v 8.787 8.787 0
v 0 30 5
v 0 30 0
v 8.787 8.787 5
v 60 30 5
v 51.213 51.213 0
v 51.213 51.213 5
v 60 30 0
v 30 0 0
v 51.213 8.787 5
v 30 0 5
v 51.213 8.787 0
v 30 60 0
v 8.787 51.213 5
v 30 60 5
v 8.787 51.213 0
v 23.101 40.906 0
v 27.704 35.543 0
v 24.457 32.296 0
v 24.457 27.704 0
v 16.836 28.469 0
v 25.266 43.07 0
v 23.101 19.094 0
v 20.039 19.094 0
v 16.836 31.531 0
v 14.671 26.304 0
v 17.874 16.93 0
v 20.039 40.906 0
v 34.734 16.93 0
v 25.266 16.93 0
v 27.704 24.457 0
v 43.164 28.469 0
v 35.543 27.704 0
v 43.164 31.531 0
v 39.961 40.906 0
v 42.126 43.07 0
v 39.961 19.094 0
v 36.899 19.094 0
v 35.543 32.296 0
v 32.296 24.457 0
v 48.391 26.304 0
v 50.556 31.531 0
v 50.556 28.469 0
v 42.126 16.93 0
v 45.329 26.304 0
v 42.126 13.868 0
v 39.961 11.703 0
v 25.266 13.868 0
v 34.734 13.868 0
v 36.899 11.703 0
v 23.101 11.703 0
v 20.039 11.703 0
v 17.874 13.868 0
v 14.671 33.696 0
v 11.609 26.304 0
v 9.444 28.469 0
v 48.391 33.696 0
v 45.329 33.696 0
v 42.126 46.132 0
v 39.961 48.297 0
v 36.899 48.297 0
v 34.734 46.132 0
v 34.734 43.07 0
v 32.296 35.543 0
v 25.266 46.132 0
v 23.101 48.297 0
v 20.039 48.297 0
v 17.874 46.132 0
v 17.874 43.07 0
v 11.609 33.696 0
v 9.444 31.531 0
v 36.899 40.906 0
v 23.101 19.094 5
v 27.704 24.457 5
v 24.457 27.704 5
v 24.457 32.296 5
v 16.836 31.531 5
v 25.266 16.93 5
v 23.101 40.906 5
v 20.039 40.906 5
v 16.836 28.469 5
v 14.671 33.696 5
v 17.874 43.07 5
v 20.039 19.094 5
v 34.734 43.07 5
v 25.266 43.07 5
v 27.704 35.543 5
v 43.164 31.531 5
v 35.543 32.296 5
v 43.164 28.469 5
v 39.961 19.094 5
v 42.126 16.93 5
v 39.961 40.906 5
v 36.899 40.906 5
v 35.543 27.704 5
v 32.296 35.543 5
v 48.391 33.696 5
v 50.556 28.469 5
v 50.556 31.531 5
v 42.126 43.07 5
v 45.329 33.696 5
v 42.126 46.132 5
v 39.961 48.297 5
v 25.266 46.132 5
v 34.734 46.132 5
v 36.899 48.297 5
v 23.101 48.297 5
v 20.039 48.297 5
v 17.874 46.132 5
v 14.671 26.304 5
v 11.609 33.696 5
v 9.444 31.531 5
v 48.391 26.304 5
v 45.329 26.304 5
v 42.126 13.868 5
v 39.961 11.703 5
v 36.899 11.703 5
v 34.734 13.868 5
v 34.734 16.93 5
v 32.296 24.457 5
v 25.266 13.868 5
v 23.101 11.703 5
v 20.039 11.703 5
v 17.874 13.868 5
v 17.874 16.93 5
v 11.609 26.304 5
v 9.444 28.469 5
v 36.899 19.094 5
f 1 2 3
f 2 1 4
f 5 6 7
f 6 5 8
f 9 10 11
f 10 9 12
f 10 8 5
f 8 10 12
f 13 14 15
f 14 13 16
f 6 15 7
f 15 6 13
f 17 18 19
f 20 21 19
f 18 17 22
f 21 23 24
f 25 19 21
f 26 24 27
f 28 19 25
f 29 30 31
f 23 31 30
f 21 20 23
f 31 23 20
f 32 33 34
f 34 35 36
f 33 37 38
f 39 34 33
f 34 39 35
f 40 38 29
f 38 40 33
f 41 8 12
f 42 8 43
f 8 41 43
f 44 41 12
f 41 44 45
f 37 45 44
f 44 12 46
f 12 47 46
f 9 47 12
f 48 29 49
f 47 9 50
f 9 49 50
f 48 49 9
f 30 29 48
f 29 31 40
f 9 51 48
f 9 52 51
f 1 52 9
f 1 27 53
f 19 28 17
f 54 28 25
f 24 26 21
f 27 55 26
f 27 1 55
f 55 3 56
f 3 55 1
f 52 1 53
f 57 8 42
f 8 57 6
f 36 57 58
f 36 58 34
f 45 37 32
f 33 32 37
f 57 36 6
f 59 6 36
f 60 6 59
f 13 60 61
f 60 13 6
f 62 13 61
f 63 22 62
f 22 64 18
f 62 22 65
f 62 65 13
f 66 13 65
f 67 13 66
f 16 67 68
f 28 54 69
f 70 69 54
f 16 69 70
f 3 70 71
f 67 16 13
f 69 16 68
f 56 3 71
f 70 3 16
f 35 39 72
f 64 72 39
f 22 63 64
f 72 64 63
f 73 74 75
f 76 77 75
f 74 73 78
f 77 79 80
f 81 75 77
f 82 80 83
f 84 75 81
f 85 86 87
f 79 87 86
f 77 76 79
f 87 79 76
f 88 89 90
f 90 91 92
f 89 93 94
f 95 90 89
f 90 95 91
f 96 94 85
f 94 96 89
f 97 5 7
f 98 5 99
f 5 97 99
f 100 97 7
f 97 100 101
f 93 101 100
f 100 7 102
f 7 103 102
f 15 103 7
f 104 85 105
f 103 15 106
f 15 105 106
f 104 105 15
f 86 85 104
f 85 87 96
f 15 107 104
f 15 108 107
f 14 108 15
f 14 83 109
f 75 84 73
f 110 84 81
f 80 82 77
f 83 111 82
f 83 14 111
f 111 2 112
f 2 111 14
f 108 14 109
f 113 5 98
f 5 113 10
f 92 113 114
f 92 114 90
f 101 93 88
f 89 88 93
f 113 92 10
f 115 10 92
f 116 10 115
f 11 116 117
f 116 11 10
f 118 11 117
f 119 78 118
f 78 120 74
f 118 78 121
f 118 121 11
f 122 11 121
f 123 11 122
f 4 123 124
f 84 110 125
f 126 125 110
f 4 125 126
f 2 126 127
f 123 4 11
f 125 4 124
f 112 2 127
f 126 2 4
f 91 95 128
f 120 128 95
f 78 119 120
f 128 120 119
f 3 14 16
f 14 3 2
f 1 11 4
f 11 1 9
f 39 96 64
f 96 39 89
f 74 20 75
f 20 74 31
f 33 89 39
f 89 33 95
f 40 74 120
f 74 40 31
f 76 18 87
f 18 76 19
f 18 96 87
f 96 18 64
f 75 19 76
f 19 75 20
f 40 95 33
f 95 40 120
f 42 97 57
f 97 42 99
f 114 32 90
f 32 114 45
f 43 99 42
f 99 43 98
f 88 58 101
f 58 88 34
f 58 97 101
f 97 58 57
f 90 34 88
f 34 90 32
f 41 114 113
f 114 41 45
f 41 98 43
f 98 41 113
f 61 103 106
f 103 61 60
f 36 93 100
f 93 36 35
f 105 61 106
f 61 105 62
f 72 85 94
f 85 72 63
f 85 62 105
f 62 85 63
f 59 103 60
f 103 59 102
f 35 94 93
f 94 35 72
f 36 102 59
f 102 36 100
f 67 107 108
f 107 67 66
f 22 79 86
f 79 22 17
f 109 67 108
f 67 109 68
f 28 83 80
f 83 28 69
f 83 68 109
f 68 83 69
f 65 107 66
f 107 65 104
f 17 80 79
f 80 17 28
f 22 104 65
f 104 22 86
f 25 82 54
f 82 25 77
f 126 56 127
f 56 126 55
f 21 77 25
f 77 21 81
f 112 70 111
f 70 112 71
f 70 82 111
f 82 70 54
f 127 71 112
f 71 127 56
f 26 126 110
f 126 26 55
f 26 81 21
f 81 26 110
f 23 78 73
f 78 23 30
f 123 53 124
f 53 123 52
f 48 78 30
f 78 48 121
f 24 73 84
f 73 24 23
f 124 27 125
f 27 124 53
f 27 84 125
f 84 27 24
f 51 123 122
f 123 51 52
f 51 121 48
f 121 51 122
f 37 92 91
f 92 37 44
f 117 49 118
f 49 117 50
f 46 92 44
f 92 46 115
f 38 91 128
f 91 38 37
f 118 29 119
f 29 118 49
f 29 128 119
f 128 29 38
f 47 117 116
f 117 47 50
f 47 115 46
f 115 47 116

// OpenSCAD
$fn = 32;

// ----------------------------------------------------------------------
// Polygon plate: 8-gon R30, 6 bolt windows
// ----------------------------------------------------------------------

// --- parameters (mm) ---
sides = 8;                // number of polygon sides
plate_r = 30;             // circumscribed radius of the polygon
bore_r = 6;               // centre bore radius
bolts = 6;                // number of bolt windows
ring_r = 16.86;           // bolt-circle radius
bolt_r = 4;               // bolt window radius
plate_t = 5;              // plate thickness, Z (extrusion height)

plate_d = 2 * plate_r;  // circumscribed diameter
bore_d = 2 * bore_r;  // centre bore diameter
bolt_d = 2 * bolt_r;  // bolt window diameter
ring_d = 2 * ring_r;  // bolt-circle diameter

profile = [[60, 30], [51.213, 51.213], [30, 60], [8.787, 51.213], [0, 30], [8.787, 8.787], [30, 0], [51.213, 8.787]];  // primary outline, 8 points, counter clockwise
void_1 = [[35.543, 32.296], [32.296, 35.543], [27.704, 35.543], [24.457, 32.296], [24.457, 27.704], [27.704, 24.457], [32.296, 24.457], [35.543, 27.704]];  // centre bore, 8 points
void_2 = [[50.556, 31.531], [48.391, 33.696], [45.329, 33.696], [43.164, 31.531], [43.164, 28.469], [45.329, 26.304], [48.391, 26.304], [50.556, 28.469]];  // bolt window 1, 8 points
void_3 = [[42.126, 46.132], [39.961, 48.297], [36.899, 48.297], [34.734, 46.132], [34.734, 43.07], [36.899, 40.906], [39.961, 40.906], [42.126, 43.07]];  // bolt window 2, 8 points
void_4 = [[25.266, 46.132], [23.101, 48.297], [20.039, 48.297], [17.874, 46.132], [17.874, 43.07], [20.039, 40.906], [23.101, 40.906], [25.266, 43.07]];  // bolt window 3, 8 points
void_5 = [[16.836, 31.531], [14.671, 33.696], [11.609, 33.696], [9.444, 31.531], [9.444, 28.469], [11.609, 26.304], [14.671, 26.304], [16.836, 28.469]];  // bolt window 4, 8 points
void_6 = [[25.266, 16.93], [23.101, 19.094], [20.039, 19.094], [17.874, 16.93], [17.874, 13.868], [20.039, 11.703], [23.101, 11.703], [25.266, 13.868]];  // bolt window 5, 8 points
void_7 = [[42.126, 16.93], [39.961, 19.094], [36.899, 19.094], [34.734, 16.93], [34.734, 13.868], [36.899, 11.703], [39.961, 11.703], [42.126, 13.868]];  // bolt window 6, 8 points

// --- the one profile operation ---
difference() {
  linear_extrude(height = plate_t) polygon(points = profile);
  translate([0, 0, -1])
    linear_extrude(height = plate_t + 2) polygon(points = void_1);
  translate([0, 0, -1])
    linear_extrude(height = plate_t + 2) polygon(points = void_2);
  translate([0, 0, -1])
    linear_extrude(height = plate_t + 2) polygon(points = void_3);
  translate([0, 0, -1])
    linear_extrude(height = plate_t + 2) polygon(points = void_4);
  translate([0, 0, -1])
    linear_extrude(height = plate_t + 2) polygon(points = void_5);
  translate([0, 0, -1])
    linear_extrude(height = plate_t + 2) polygon(points = void_6);
  translate([0, 0, -1])
    linear_extrude(height = plate_t + 2) polygon(points = void_7);
}
